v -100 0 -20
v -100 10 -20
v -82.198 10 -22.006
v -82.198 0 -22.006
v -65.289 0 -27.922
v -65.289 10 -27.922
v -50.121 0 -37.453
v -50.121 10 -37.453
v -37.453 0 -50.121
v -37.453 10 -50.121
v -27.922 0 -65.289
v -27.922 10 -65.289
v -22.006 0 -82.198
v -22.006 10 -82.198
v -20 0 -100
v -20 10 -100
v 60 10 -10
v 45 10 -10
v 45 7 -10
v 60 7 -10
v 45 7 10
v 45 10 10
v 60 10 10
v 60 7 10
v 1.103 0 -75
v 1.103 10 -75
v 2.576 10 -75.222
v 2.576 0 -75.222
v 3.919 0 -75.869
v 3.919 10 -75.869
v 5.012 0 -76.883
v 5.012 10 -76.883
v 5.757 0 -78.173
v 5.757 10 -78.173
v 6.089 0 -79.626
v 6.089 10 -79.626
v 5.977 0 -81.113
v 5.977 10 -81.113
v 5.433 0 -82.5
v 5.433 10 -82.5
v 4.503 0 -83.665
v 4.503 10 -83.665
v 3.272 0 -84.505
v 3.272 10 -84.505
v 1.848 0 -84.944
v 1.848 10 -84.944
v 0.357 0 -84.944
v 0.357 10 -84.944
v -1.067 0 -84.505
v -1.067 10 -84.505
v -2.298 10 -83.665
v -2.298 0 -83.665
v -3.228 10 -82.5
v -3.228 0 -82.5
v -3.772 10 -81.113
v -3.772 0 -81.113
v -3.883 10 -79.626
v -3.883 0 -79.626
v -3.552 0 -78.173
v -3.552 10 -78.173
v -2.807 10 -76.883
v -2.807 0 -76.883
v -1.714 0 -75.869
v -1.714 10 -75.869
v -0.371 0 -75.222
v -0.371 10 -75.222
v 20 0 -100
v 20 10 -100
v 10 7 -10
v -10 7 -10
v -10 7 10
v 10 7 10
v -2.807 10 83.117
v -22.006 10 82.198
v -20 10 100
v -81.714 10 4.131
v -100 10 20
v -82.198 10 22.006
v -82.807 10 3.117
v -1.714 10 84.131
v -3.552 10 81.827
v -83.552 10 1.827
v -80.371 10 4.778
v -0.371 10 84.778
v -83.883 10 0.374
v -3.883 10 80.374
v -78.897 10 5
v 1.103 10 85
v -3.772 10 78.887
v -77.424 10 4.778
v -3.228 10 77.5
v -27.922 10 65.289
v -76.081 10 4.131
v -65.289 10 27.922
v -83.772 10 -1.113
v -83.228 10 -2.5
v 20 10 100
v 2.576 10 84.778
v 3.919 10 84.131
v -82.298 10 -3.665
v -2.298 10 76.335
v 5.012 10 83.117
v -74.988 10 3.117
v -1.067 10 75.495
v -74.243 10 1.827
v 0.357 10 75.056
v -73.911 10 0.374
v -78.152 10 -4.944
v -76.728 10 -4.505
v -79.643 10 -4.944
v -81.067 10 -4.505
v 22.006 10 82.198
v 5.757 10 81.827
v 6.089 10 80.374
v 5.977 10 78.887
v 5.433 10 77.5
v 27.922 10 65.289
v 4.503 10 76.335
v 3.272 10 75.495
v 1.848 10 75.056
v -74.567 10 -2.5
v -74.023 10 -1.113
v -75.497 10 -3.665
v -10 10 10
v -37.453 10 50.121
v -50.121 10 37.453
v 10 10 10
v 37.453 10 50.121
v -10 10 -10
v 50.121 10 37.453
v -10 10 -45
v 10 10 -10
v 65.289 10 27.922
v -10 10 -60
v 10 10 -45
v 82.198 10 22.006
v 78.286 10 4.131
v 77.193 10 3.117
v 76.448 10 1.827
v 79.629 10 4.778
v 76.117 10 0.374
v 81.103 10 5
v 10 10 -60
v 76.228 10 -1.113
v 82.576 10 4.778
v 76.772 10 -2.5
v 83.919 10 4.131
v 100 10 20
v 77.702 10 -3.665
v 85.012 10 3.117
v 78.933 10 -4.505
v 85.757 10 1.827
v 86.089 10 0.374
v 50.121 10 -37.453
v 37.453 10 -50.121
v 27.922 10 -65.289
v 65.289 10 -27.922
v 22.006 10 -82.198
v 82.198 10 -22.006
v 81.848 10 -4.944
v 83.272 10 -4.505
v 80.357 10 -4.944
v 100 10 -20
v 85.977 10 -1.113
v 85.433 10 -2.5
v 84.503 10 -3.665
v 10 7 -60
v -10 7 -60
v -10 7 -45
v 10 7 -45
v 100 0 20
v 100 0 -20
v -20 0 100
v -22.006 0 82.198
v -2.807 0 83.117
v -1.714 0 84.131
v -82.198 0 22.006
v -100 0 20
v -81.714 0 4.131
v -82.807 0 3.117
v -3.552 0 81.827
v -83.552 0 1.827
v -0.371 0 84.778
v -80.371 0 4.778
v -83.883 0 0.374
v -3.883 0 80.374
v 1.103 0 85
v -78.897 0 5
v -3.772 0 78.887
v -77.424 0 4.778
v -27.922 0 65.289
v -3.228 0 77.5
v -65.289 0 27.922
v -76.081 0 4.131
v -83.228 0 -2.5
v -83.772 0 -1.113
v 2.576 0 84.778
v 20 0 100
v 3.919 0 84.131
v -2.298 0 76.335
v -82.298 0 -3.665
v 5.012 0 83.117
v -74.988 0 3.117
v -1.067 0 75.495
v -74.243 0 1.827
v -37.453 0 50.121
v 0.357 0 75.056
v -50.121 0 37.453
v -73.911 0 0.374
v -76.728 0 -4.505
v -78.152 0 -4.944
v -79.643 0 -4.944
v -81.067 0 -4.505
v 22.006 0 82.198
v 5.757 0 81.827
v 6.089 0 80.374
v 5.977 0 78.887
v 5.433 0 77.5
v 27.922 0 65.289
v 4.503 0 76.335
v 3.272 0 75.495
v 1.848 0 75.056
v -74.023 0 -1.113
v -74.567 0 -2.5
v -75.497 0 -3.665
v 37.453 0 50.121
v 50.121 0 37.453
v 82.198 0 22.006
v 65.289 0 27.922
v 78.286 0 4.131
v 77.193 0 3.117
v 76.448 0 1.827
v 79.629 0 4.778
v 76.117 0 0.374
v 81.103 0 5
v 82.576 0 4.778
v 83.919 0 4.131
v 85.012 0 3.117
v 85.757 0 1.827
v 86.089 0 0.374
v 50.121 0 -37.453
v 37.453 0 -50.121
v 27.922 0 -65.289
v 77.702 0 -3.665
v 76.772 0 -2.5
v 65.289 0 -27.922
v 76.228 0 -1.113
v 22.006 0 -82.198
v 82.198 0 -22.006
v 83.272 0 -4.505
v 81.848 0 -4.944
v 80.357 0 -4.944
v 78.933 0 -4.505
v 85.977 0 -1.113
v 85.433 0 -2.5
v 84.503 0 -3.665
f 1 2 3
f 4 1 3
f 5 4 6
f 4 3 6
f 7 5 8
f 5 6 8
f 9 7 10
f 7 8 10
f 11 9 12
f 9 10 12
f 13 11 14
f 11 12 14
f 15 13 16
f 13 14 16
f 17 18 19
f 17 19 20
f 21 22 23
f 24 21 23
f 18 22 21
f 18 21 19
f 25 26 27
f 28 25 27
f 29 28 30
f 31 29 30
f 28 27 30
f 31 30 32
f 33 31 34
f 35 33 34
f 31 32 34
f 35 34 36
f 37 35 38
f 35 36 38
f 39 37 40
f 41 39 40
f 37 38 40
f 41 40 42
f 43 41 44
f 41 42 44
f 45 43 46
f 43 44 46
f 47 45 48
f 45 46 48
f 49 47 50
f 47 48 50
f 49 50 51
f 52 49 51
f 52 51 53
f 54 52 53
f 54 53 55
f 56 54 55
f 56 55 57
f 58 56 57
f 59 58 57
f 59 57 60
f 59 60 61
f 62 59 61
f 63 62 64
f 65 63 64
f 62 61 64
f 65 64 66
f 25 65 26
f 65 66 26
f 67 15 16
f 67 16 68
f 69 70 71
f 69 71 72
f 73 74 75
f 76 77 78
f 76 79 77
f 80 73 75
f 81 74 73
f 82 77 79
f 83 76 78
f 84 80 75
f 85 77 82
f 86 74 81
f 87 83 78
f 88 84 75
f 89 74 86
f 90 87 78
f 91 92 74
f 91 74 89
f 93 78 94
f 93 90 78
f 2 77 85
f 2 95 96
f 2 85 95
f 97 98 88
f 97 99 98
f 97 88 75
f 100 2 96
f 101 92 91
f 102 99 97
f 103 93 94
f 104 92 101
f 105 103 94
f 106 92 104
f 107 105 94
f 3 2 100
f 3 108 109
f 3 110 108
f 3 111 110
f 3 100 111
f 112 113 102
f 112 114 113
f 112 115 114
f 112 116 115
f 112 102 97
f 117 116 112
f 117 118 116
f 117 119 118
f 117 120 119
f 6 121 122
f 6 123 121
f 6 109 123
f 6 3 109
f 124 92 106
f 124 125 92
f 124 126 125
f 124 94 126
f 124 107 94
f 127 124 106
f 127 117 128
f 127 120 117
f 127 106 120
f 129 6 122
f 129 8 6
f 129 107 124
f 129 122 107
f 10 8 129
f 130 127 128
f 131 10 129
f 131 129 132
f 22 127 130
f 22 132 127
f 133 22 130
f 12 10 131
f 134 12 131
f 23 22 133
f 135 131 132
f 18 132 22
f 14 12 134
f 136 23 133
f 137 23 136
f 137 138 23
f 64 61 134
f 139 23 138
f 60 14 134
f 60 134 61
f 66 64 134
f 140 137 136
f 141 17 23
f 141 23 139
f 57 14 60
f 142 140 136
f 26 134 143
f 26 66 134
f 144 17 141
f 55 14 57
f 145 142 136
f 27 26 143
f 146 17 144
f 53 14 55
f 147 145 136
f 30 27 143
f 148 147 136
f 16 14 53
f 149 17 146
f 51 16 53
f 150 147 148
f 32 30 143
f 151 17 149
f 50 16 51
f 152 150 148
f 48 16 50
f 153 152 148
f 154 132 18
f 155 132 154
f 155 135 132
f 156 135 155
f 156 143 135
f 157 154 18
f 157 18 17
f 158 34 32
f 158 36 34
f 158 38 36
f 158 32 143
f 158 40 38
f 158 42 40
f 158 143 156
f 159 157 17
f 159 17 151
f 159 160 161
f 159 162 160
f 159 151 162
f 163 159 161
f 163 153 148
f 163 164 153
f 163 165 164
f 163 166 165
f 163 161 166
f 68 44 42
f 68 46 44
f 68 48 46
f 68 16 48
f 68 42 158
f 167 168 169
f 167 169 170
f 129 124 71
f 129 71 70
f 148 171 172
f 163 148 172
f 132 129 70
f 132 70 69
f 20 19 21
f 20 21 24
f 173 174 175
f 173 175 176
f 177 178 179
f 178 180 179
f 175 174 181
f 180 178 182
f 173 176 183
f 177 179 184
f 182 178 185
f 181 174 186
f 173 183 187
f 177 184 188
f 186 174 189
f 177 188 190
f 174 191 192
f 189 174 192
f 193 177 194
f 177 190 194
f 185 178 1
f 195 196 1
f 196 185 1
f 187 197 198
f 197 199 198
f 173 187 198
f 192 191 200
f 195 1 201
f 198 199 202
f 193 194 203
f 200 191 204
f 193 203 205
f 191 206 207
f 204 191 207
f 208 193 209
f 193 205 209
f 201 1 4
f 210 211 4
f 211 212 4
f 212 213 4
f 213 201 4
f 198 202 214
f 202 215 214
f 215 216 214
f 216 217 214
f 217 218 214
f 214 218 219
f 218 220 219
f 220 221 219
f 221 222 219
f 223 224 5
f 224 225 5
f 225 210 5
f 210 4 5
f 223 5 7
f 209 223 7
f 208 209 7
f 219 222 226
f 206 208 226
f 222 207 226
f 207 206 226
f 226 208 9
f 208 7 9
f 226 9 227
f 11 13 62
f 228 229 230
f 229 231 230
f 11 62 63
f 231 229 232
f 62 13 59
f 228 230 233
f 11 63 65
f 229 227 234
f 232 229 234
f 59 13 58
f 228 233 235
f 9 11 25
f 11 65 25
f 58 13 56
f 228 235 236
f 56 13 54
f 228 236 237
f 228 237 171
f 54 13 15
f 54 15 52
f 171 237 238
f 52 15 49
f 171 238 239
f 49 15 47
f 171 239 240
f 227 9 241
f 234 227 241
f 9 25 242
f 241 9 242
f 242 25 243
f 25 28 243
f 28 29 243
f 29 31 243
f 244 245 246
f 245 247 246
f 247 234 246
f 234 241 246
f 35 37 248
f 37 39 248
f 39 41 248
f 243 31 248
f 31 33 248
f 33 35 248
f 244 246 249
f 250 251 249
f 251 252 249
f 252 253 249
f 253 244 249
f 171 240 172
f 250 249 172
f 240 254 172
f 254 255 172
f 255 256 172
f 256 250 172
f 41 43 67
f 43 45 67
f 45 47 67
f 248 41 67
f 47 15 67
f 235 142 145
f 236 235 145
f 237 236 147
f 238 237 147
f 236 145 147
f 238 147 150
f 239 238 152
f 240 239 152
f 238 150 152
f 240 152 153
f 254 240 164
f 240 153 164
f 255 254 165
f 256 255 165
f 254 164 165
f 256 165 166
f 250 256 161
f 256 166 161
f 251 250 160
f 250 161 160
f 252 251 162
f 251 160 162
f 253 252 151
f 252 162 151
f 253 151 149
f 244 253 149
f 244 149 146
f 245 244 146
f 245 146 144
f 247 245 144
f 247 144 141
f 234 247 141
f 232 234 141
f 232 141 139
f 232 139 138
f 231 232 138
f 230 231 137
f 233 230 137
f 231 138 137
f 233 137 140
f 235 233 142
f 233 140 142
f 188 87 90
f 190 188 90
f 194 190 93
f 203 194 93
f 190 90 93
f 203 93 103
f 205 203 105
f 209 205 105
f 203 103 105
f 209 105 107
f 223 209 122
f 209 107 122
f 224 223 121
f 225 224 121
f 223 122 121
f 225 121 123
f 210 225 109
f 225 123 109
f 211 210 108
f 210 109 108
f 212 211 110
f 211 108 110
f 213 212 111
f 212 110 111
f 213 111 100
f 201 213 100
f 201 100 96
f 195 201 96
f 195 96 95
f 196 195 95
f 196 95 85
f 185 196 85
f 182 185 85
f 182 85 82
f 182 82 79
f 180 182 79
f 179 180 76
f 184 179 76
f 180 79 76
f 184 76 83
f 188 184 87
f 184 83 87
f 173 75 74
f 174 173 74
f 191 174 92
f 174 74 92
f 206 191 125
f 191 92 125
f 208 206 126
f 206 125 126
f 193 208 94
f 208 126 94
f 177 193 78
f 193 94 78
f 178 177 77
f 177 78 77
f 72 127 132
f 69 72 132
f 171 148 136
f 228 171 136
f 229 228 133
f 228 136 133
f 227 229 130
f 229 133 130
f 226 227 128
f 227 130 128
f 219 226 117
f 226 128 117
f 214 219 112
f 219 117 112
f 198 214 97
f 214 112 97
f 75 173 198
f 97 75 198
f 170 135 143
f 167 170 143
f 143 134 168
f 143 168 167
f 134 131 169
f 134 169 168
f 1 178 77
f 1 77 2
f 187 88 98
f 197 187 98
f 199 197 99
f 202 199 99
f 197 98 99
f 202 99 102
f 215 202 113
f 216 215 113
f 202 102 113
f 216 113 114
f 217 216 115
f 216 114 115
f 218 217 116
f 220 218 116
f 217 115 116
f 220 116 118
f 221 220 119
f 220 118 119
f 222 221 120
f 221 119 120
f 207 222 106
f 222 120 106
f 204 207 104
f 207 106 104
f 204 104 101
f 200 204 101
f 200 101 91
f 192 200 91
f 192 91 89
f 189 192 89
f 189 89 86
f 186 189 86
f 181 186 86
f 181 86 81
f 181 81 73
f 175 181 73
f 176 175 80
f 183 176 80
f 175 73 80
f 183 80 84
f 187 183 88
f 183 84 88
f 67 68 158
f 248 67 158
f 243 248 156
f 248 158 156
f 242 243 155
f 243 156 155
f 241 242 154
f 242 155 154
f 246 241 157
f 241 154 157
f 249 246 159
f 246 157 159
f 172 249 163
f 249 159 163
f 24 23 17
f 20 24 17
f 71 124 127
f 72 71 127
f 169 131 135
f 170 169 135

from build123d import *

# Parameters (mm, degrees)
CROQUIS1_W              = 200
CROQUIS1_H              = 200
SALIENTE_EXTRUIR1_DEPTH = 10
CROQUIS2_W              = 20
CROQUIS2_H              = 20
CROQUIS2_H_2            = 15
CROQUIS2_W_2            = 15
CORTAR_EXTRUIR1_DEPTH   = 3
CORTAR_EXTRUIR2_DEPTH   = 10
CROQUIS4_R              = 5
CORTAR_EXTRUIR3_DEPTH   = 10


with BuildPart() as part:
    # Croquis1 → Saliente-Extruir1 (new body)
    with BuildSketch(Plane(origin=(0, 0, 0), x_dir=(1, 0, 0), z_dir=(0, 1, 0))):
        Rectangle(CROQUIS1_W, CROQUIS1_H)
    extrude(amount=SALIENTE_EXTRUIR1_DEPTH)

    # Croquis2 → Cortar-Extruir1 (cut)
    with BuildSketch(Plane(origin=(0, 10, 0), x_dir=(1, 0, 0), z_dir=(0, 1, 0))):
        Rectangle(CROQUIS2_W, CROQUIS2_H)
        with Locations((0, 52.5)):
            Rectangle(CROQUIS2_W, CROQUIS2_H_2)
        with Locations((52.5, 0)):
            Rectangle(CROQUIS2_W_2, CROQUIS2_H)
    extrude(amount=-CORTAR_EXTRUIR1_DEPTH, mode=Mode.SUBTRACT)

    # Croquis3 → Cortar-Extruir2 (cut)
    with BuildSketch(Plane(origin=(0, 10, 0), x_dir=(1, 0, 0), z_dir=(0, 1, 0))):
        with BuildLine():
            Line((100, 100), (20, 100))
            ThreePointArc((20, 100), (43.431457505, 43.431457505), (100, 20))
            Line((100, 20), (100, 100))
        make_face()
        with BuildLine():
            ThreePointArc((-100, 20), (-43.431457505, 43.431457505), (-20, 100))
            Line((-20, 100), (-100, 100))
            Line((-100, 100), (-100, 20))
        make_face()
        with BuildLine():
            ThreePointArc((-20, -100), (-43.431457505, -43.431457505), (-100, -20))
            Line((-100, -20), (-100, -100))
            Line((-100, -100), (-20, -100))
        make_face()
        with BuildLine():
            Line((100, -100), (100, -20))
            ThreePointArc((100, -20), (43.431457505, -43.431457505), (20, -100))
            Line((20, -100), (100, -100))
        make_face()
    extrude(amount=-CORTAR_EXTRUIR2_DEPTH, mode=Mode.SUBTRACT)

    # Croquis4 → Cortar-Extruir3 (cut)
    with BuildSketch(Plane(origin=(0, 10, 0), x_dir=(1, 0, 0), z_dir=(0, 1, 0))):
        with Locations(Location((-78.897440542, 0, 0), (0, 0, 270))):
            Circle(CROQUIS4_R)
        with Locations(Location((1.102559458, 80, 0), (0, 0, 270))):
            Circle(CROQUIS4_R)
        with Locations(Location((81.102559458, 0, 0), (0, 0, 270))):
            Circle(CROQUIS4_R)
        with Locations(Location((1.102559458, -80, 0), (0, 0, 270))):
            Circle(CROQUIS4_R)
    extrude(amount=-CORTAR_EXTRUIR3_DEPTH, mode=Mode.SUBTRACT)


solid = part.part
